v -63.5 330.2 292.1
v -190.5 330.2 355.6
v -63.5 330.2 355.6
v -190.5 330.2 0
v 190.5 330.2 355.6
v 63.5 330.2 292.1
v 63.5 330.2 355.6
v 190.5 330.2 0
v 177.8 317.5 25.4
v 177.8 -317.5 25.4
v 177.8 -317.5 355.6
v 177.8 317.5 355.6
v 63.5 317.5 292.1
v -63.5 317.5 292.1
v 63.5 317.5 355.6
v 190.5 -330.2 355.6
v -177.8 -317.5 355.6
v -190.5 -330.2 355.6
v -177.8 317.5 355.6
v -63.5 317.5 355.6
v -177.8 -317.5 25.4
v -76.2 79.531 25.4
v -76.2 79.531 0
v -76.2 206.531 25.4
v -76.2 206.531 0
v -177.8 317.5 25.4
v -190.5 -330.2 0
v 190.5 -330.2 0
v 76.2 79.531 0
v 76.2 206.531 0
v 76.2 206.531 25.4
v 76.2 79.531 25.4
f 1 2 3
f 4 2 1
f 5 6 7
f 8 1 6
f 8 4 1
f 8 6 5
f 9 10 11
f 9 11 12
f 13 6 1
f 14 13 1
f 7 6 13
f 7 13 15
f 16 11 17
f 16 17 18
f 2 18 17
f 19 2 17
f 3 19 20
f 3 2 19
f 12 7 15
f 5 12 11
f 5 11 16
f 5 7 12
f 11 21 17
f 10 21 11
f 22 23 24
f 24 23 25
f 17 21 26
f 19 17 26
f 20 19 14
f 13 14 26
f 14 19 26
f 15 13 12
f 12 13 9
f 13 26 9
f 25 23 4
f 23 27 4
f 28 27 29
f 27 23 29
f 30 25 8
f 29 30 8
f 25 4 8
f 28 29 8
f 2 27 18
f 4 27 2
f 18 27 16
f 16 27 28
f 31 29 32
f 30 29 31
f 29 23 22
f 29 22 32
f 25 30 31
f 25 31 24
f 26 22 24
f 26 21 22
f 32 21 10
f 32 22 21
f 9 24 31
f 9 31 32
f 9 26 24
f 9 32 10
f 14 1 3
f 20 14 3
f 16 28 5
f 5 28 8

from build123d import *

# Parameters (mm, degrees)
F0_W     = 381
F0_H     = 660.4
F0_W_2   = 355.6
F0_H_2   = 635
F1_DEPTH = 355.6
F2_DEPTH = 25.4
F3_W     = 76.2
F3_H     = 127
F4_DEPTH = 25.4
F5_W     = 127
F5_H     = 127
F6_DEPTH = 25.4


with BuildPart() as f1:
    # F0 (on Top) → F1 (new body)
    with BuildSketch(Plane.XY):
        Rectangle(F0_W, F0_H)
        Rectangle(F0_W_2, F0_H_2, mode=Mode.SUBTRACT)
    extrude(amount=F1_DEPTH)

    # F0 (on Top) → F2 (join)
    with BuildSketch(Plane.XY):
        Rectangle(F0_W_2, F0_H_2)
    extrude(amount=F2_DEPTH)

    # F3 (on face) → F4 (cut)
    with BuildSketch(Plane.XY):
        with Locations((-38.1, 143.031146)):
            Rectangle(F3_W, F3_H)
        with Locations((38.1, 143.031146)):
            Rectangle(F3_W, F3_H)
    extrude(amount=F4_DEPTH, mode=Mode.SUBTRACT)

    # F5 (on face) → F6 (cut)
    with BuildSketch(Plane(origin=(0, 330.2, 0), x_dir=(-1, 0, 0), z_dir=(0, 1, 0))):
        with Locations((0, 355.6)):
            Rectangle(F5_W, F5_H)
    extrude(amount=-F6_DEPTH, mode=Mode.SUBTRACT)


solid = f1.part
